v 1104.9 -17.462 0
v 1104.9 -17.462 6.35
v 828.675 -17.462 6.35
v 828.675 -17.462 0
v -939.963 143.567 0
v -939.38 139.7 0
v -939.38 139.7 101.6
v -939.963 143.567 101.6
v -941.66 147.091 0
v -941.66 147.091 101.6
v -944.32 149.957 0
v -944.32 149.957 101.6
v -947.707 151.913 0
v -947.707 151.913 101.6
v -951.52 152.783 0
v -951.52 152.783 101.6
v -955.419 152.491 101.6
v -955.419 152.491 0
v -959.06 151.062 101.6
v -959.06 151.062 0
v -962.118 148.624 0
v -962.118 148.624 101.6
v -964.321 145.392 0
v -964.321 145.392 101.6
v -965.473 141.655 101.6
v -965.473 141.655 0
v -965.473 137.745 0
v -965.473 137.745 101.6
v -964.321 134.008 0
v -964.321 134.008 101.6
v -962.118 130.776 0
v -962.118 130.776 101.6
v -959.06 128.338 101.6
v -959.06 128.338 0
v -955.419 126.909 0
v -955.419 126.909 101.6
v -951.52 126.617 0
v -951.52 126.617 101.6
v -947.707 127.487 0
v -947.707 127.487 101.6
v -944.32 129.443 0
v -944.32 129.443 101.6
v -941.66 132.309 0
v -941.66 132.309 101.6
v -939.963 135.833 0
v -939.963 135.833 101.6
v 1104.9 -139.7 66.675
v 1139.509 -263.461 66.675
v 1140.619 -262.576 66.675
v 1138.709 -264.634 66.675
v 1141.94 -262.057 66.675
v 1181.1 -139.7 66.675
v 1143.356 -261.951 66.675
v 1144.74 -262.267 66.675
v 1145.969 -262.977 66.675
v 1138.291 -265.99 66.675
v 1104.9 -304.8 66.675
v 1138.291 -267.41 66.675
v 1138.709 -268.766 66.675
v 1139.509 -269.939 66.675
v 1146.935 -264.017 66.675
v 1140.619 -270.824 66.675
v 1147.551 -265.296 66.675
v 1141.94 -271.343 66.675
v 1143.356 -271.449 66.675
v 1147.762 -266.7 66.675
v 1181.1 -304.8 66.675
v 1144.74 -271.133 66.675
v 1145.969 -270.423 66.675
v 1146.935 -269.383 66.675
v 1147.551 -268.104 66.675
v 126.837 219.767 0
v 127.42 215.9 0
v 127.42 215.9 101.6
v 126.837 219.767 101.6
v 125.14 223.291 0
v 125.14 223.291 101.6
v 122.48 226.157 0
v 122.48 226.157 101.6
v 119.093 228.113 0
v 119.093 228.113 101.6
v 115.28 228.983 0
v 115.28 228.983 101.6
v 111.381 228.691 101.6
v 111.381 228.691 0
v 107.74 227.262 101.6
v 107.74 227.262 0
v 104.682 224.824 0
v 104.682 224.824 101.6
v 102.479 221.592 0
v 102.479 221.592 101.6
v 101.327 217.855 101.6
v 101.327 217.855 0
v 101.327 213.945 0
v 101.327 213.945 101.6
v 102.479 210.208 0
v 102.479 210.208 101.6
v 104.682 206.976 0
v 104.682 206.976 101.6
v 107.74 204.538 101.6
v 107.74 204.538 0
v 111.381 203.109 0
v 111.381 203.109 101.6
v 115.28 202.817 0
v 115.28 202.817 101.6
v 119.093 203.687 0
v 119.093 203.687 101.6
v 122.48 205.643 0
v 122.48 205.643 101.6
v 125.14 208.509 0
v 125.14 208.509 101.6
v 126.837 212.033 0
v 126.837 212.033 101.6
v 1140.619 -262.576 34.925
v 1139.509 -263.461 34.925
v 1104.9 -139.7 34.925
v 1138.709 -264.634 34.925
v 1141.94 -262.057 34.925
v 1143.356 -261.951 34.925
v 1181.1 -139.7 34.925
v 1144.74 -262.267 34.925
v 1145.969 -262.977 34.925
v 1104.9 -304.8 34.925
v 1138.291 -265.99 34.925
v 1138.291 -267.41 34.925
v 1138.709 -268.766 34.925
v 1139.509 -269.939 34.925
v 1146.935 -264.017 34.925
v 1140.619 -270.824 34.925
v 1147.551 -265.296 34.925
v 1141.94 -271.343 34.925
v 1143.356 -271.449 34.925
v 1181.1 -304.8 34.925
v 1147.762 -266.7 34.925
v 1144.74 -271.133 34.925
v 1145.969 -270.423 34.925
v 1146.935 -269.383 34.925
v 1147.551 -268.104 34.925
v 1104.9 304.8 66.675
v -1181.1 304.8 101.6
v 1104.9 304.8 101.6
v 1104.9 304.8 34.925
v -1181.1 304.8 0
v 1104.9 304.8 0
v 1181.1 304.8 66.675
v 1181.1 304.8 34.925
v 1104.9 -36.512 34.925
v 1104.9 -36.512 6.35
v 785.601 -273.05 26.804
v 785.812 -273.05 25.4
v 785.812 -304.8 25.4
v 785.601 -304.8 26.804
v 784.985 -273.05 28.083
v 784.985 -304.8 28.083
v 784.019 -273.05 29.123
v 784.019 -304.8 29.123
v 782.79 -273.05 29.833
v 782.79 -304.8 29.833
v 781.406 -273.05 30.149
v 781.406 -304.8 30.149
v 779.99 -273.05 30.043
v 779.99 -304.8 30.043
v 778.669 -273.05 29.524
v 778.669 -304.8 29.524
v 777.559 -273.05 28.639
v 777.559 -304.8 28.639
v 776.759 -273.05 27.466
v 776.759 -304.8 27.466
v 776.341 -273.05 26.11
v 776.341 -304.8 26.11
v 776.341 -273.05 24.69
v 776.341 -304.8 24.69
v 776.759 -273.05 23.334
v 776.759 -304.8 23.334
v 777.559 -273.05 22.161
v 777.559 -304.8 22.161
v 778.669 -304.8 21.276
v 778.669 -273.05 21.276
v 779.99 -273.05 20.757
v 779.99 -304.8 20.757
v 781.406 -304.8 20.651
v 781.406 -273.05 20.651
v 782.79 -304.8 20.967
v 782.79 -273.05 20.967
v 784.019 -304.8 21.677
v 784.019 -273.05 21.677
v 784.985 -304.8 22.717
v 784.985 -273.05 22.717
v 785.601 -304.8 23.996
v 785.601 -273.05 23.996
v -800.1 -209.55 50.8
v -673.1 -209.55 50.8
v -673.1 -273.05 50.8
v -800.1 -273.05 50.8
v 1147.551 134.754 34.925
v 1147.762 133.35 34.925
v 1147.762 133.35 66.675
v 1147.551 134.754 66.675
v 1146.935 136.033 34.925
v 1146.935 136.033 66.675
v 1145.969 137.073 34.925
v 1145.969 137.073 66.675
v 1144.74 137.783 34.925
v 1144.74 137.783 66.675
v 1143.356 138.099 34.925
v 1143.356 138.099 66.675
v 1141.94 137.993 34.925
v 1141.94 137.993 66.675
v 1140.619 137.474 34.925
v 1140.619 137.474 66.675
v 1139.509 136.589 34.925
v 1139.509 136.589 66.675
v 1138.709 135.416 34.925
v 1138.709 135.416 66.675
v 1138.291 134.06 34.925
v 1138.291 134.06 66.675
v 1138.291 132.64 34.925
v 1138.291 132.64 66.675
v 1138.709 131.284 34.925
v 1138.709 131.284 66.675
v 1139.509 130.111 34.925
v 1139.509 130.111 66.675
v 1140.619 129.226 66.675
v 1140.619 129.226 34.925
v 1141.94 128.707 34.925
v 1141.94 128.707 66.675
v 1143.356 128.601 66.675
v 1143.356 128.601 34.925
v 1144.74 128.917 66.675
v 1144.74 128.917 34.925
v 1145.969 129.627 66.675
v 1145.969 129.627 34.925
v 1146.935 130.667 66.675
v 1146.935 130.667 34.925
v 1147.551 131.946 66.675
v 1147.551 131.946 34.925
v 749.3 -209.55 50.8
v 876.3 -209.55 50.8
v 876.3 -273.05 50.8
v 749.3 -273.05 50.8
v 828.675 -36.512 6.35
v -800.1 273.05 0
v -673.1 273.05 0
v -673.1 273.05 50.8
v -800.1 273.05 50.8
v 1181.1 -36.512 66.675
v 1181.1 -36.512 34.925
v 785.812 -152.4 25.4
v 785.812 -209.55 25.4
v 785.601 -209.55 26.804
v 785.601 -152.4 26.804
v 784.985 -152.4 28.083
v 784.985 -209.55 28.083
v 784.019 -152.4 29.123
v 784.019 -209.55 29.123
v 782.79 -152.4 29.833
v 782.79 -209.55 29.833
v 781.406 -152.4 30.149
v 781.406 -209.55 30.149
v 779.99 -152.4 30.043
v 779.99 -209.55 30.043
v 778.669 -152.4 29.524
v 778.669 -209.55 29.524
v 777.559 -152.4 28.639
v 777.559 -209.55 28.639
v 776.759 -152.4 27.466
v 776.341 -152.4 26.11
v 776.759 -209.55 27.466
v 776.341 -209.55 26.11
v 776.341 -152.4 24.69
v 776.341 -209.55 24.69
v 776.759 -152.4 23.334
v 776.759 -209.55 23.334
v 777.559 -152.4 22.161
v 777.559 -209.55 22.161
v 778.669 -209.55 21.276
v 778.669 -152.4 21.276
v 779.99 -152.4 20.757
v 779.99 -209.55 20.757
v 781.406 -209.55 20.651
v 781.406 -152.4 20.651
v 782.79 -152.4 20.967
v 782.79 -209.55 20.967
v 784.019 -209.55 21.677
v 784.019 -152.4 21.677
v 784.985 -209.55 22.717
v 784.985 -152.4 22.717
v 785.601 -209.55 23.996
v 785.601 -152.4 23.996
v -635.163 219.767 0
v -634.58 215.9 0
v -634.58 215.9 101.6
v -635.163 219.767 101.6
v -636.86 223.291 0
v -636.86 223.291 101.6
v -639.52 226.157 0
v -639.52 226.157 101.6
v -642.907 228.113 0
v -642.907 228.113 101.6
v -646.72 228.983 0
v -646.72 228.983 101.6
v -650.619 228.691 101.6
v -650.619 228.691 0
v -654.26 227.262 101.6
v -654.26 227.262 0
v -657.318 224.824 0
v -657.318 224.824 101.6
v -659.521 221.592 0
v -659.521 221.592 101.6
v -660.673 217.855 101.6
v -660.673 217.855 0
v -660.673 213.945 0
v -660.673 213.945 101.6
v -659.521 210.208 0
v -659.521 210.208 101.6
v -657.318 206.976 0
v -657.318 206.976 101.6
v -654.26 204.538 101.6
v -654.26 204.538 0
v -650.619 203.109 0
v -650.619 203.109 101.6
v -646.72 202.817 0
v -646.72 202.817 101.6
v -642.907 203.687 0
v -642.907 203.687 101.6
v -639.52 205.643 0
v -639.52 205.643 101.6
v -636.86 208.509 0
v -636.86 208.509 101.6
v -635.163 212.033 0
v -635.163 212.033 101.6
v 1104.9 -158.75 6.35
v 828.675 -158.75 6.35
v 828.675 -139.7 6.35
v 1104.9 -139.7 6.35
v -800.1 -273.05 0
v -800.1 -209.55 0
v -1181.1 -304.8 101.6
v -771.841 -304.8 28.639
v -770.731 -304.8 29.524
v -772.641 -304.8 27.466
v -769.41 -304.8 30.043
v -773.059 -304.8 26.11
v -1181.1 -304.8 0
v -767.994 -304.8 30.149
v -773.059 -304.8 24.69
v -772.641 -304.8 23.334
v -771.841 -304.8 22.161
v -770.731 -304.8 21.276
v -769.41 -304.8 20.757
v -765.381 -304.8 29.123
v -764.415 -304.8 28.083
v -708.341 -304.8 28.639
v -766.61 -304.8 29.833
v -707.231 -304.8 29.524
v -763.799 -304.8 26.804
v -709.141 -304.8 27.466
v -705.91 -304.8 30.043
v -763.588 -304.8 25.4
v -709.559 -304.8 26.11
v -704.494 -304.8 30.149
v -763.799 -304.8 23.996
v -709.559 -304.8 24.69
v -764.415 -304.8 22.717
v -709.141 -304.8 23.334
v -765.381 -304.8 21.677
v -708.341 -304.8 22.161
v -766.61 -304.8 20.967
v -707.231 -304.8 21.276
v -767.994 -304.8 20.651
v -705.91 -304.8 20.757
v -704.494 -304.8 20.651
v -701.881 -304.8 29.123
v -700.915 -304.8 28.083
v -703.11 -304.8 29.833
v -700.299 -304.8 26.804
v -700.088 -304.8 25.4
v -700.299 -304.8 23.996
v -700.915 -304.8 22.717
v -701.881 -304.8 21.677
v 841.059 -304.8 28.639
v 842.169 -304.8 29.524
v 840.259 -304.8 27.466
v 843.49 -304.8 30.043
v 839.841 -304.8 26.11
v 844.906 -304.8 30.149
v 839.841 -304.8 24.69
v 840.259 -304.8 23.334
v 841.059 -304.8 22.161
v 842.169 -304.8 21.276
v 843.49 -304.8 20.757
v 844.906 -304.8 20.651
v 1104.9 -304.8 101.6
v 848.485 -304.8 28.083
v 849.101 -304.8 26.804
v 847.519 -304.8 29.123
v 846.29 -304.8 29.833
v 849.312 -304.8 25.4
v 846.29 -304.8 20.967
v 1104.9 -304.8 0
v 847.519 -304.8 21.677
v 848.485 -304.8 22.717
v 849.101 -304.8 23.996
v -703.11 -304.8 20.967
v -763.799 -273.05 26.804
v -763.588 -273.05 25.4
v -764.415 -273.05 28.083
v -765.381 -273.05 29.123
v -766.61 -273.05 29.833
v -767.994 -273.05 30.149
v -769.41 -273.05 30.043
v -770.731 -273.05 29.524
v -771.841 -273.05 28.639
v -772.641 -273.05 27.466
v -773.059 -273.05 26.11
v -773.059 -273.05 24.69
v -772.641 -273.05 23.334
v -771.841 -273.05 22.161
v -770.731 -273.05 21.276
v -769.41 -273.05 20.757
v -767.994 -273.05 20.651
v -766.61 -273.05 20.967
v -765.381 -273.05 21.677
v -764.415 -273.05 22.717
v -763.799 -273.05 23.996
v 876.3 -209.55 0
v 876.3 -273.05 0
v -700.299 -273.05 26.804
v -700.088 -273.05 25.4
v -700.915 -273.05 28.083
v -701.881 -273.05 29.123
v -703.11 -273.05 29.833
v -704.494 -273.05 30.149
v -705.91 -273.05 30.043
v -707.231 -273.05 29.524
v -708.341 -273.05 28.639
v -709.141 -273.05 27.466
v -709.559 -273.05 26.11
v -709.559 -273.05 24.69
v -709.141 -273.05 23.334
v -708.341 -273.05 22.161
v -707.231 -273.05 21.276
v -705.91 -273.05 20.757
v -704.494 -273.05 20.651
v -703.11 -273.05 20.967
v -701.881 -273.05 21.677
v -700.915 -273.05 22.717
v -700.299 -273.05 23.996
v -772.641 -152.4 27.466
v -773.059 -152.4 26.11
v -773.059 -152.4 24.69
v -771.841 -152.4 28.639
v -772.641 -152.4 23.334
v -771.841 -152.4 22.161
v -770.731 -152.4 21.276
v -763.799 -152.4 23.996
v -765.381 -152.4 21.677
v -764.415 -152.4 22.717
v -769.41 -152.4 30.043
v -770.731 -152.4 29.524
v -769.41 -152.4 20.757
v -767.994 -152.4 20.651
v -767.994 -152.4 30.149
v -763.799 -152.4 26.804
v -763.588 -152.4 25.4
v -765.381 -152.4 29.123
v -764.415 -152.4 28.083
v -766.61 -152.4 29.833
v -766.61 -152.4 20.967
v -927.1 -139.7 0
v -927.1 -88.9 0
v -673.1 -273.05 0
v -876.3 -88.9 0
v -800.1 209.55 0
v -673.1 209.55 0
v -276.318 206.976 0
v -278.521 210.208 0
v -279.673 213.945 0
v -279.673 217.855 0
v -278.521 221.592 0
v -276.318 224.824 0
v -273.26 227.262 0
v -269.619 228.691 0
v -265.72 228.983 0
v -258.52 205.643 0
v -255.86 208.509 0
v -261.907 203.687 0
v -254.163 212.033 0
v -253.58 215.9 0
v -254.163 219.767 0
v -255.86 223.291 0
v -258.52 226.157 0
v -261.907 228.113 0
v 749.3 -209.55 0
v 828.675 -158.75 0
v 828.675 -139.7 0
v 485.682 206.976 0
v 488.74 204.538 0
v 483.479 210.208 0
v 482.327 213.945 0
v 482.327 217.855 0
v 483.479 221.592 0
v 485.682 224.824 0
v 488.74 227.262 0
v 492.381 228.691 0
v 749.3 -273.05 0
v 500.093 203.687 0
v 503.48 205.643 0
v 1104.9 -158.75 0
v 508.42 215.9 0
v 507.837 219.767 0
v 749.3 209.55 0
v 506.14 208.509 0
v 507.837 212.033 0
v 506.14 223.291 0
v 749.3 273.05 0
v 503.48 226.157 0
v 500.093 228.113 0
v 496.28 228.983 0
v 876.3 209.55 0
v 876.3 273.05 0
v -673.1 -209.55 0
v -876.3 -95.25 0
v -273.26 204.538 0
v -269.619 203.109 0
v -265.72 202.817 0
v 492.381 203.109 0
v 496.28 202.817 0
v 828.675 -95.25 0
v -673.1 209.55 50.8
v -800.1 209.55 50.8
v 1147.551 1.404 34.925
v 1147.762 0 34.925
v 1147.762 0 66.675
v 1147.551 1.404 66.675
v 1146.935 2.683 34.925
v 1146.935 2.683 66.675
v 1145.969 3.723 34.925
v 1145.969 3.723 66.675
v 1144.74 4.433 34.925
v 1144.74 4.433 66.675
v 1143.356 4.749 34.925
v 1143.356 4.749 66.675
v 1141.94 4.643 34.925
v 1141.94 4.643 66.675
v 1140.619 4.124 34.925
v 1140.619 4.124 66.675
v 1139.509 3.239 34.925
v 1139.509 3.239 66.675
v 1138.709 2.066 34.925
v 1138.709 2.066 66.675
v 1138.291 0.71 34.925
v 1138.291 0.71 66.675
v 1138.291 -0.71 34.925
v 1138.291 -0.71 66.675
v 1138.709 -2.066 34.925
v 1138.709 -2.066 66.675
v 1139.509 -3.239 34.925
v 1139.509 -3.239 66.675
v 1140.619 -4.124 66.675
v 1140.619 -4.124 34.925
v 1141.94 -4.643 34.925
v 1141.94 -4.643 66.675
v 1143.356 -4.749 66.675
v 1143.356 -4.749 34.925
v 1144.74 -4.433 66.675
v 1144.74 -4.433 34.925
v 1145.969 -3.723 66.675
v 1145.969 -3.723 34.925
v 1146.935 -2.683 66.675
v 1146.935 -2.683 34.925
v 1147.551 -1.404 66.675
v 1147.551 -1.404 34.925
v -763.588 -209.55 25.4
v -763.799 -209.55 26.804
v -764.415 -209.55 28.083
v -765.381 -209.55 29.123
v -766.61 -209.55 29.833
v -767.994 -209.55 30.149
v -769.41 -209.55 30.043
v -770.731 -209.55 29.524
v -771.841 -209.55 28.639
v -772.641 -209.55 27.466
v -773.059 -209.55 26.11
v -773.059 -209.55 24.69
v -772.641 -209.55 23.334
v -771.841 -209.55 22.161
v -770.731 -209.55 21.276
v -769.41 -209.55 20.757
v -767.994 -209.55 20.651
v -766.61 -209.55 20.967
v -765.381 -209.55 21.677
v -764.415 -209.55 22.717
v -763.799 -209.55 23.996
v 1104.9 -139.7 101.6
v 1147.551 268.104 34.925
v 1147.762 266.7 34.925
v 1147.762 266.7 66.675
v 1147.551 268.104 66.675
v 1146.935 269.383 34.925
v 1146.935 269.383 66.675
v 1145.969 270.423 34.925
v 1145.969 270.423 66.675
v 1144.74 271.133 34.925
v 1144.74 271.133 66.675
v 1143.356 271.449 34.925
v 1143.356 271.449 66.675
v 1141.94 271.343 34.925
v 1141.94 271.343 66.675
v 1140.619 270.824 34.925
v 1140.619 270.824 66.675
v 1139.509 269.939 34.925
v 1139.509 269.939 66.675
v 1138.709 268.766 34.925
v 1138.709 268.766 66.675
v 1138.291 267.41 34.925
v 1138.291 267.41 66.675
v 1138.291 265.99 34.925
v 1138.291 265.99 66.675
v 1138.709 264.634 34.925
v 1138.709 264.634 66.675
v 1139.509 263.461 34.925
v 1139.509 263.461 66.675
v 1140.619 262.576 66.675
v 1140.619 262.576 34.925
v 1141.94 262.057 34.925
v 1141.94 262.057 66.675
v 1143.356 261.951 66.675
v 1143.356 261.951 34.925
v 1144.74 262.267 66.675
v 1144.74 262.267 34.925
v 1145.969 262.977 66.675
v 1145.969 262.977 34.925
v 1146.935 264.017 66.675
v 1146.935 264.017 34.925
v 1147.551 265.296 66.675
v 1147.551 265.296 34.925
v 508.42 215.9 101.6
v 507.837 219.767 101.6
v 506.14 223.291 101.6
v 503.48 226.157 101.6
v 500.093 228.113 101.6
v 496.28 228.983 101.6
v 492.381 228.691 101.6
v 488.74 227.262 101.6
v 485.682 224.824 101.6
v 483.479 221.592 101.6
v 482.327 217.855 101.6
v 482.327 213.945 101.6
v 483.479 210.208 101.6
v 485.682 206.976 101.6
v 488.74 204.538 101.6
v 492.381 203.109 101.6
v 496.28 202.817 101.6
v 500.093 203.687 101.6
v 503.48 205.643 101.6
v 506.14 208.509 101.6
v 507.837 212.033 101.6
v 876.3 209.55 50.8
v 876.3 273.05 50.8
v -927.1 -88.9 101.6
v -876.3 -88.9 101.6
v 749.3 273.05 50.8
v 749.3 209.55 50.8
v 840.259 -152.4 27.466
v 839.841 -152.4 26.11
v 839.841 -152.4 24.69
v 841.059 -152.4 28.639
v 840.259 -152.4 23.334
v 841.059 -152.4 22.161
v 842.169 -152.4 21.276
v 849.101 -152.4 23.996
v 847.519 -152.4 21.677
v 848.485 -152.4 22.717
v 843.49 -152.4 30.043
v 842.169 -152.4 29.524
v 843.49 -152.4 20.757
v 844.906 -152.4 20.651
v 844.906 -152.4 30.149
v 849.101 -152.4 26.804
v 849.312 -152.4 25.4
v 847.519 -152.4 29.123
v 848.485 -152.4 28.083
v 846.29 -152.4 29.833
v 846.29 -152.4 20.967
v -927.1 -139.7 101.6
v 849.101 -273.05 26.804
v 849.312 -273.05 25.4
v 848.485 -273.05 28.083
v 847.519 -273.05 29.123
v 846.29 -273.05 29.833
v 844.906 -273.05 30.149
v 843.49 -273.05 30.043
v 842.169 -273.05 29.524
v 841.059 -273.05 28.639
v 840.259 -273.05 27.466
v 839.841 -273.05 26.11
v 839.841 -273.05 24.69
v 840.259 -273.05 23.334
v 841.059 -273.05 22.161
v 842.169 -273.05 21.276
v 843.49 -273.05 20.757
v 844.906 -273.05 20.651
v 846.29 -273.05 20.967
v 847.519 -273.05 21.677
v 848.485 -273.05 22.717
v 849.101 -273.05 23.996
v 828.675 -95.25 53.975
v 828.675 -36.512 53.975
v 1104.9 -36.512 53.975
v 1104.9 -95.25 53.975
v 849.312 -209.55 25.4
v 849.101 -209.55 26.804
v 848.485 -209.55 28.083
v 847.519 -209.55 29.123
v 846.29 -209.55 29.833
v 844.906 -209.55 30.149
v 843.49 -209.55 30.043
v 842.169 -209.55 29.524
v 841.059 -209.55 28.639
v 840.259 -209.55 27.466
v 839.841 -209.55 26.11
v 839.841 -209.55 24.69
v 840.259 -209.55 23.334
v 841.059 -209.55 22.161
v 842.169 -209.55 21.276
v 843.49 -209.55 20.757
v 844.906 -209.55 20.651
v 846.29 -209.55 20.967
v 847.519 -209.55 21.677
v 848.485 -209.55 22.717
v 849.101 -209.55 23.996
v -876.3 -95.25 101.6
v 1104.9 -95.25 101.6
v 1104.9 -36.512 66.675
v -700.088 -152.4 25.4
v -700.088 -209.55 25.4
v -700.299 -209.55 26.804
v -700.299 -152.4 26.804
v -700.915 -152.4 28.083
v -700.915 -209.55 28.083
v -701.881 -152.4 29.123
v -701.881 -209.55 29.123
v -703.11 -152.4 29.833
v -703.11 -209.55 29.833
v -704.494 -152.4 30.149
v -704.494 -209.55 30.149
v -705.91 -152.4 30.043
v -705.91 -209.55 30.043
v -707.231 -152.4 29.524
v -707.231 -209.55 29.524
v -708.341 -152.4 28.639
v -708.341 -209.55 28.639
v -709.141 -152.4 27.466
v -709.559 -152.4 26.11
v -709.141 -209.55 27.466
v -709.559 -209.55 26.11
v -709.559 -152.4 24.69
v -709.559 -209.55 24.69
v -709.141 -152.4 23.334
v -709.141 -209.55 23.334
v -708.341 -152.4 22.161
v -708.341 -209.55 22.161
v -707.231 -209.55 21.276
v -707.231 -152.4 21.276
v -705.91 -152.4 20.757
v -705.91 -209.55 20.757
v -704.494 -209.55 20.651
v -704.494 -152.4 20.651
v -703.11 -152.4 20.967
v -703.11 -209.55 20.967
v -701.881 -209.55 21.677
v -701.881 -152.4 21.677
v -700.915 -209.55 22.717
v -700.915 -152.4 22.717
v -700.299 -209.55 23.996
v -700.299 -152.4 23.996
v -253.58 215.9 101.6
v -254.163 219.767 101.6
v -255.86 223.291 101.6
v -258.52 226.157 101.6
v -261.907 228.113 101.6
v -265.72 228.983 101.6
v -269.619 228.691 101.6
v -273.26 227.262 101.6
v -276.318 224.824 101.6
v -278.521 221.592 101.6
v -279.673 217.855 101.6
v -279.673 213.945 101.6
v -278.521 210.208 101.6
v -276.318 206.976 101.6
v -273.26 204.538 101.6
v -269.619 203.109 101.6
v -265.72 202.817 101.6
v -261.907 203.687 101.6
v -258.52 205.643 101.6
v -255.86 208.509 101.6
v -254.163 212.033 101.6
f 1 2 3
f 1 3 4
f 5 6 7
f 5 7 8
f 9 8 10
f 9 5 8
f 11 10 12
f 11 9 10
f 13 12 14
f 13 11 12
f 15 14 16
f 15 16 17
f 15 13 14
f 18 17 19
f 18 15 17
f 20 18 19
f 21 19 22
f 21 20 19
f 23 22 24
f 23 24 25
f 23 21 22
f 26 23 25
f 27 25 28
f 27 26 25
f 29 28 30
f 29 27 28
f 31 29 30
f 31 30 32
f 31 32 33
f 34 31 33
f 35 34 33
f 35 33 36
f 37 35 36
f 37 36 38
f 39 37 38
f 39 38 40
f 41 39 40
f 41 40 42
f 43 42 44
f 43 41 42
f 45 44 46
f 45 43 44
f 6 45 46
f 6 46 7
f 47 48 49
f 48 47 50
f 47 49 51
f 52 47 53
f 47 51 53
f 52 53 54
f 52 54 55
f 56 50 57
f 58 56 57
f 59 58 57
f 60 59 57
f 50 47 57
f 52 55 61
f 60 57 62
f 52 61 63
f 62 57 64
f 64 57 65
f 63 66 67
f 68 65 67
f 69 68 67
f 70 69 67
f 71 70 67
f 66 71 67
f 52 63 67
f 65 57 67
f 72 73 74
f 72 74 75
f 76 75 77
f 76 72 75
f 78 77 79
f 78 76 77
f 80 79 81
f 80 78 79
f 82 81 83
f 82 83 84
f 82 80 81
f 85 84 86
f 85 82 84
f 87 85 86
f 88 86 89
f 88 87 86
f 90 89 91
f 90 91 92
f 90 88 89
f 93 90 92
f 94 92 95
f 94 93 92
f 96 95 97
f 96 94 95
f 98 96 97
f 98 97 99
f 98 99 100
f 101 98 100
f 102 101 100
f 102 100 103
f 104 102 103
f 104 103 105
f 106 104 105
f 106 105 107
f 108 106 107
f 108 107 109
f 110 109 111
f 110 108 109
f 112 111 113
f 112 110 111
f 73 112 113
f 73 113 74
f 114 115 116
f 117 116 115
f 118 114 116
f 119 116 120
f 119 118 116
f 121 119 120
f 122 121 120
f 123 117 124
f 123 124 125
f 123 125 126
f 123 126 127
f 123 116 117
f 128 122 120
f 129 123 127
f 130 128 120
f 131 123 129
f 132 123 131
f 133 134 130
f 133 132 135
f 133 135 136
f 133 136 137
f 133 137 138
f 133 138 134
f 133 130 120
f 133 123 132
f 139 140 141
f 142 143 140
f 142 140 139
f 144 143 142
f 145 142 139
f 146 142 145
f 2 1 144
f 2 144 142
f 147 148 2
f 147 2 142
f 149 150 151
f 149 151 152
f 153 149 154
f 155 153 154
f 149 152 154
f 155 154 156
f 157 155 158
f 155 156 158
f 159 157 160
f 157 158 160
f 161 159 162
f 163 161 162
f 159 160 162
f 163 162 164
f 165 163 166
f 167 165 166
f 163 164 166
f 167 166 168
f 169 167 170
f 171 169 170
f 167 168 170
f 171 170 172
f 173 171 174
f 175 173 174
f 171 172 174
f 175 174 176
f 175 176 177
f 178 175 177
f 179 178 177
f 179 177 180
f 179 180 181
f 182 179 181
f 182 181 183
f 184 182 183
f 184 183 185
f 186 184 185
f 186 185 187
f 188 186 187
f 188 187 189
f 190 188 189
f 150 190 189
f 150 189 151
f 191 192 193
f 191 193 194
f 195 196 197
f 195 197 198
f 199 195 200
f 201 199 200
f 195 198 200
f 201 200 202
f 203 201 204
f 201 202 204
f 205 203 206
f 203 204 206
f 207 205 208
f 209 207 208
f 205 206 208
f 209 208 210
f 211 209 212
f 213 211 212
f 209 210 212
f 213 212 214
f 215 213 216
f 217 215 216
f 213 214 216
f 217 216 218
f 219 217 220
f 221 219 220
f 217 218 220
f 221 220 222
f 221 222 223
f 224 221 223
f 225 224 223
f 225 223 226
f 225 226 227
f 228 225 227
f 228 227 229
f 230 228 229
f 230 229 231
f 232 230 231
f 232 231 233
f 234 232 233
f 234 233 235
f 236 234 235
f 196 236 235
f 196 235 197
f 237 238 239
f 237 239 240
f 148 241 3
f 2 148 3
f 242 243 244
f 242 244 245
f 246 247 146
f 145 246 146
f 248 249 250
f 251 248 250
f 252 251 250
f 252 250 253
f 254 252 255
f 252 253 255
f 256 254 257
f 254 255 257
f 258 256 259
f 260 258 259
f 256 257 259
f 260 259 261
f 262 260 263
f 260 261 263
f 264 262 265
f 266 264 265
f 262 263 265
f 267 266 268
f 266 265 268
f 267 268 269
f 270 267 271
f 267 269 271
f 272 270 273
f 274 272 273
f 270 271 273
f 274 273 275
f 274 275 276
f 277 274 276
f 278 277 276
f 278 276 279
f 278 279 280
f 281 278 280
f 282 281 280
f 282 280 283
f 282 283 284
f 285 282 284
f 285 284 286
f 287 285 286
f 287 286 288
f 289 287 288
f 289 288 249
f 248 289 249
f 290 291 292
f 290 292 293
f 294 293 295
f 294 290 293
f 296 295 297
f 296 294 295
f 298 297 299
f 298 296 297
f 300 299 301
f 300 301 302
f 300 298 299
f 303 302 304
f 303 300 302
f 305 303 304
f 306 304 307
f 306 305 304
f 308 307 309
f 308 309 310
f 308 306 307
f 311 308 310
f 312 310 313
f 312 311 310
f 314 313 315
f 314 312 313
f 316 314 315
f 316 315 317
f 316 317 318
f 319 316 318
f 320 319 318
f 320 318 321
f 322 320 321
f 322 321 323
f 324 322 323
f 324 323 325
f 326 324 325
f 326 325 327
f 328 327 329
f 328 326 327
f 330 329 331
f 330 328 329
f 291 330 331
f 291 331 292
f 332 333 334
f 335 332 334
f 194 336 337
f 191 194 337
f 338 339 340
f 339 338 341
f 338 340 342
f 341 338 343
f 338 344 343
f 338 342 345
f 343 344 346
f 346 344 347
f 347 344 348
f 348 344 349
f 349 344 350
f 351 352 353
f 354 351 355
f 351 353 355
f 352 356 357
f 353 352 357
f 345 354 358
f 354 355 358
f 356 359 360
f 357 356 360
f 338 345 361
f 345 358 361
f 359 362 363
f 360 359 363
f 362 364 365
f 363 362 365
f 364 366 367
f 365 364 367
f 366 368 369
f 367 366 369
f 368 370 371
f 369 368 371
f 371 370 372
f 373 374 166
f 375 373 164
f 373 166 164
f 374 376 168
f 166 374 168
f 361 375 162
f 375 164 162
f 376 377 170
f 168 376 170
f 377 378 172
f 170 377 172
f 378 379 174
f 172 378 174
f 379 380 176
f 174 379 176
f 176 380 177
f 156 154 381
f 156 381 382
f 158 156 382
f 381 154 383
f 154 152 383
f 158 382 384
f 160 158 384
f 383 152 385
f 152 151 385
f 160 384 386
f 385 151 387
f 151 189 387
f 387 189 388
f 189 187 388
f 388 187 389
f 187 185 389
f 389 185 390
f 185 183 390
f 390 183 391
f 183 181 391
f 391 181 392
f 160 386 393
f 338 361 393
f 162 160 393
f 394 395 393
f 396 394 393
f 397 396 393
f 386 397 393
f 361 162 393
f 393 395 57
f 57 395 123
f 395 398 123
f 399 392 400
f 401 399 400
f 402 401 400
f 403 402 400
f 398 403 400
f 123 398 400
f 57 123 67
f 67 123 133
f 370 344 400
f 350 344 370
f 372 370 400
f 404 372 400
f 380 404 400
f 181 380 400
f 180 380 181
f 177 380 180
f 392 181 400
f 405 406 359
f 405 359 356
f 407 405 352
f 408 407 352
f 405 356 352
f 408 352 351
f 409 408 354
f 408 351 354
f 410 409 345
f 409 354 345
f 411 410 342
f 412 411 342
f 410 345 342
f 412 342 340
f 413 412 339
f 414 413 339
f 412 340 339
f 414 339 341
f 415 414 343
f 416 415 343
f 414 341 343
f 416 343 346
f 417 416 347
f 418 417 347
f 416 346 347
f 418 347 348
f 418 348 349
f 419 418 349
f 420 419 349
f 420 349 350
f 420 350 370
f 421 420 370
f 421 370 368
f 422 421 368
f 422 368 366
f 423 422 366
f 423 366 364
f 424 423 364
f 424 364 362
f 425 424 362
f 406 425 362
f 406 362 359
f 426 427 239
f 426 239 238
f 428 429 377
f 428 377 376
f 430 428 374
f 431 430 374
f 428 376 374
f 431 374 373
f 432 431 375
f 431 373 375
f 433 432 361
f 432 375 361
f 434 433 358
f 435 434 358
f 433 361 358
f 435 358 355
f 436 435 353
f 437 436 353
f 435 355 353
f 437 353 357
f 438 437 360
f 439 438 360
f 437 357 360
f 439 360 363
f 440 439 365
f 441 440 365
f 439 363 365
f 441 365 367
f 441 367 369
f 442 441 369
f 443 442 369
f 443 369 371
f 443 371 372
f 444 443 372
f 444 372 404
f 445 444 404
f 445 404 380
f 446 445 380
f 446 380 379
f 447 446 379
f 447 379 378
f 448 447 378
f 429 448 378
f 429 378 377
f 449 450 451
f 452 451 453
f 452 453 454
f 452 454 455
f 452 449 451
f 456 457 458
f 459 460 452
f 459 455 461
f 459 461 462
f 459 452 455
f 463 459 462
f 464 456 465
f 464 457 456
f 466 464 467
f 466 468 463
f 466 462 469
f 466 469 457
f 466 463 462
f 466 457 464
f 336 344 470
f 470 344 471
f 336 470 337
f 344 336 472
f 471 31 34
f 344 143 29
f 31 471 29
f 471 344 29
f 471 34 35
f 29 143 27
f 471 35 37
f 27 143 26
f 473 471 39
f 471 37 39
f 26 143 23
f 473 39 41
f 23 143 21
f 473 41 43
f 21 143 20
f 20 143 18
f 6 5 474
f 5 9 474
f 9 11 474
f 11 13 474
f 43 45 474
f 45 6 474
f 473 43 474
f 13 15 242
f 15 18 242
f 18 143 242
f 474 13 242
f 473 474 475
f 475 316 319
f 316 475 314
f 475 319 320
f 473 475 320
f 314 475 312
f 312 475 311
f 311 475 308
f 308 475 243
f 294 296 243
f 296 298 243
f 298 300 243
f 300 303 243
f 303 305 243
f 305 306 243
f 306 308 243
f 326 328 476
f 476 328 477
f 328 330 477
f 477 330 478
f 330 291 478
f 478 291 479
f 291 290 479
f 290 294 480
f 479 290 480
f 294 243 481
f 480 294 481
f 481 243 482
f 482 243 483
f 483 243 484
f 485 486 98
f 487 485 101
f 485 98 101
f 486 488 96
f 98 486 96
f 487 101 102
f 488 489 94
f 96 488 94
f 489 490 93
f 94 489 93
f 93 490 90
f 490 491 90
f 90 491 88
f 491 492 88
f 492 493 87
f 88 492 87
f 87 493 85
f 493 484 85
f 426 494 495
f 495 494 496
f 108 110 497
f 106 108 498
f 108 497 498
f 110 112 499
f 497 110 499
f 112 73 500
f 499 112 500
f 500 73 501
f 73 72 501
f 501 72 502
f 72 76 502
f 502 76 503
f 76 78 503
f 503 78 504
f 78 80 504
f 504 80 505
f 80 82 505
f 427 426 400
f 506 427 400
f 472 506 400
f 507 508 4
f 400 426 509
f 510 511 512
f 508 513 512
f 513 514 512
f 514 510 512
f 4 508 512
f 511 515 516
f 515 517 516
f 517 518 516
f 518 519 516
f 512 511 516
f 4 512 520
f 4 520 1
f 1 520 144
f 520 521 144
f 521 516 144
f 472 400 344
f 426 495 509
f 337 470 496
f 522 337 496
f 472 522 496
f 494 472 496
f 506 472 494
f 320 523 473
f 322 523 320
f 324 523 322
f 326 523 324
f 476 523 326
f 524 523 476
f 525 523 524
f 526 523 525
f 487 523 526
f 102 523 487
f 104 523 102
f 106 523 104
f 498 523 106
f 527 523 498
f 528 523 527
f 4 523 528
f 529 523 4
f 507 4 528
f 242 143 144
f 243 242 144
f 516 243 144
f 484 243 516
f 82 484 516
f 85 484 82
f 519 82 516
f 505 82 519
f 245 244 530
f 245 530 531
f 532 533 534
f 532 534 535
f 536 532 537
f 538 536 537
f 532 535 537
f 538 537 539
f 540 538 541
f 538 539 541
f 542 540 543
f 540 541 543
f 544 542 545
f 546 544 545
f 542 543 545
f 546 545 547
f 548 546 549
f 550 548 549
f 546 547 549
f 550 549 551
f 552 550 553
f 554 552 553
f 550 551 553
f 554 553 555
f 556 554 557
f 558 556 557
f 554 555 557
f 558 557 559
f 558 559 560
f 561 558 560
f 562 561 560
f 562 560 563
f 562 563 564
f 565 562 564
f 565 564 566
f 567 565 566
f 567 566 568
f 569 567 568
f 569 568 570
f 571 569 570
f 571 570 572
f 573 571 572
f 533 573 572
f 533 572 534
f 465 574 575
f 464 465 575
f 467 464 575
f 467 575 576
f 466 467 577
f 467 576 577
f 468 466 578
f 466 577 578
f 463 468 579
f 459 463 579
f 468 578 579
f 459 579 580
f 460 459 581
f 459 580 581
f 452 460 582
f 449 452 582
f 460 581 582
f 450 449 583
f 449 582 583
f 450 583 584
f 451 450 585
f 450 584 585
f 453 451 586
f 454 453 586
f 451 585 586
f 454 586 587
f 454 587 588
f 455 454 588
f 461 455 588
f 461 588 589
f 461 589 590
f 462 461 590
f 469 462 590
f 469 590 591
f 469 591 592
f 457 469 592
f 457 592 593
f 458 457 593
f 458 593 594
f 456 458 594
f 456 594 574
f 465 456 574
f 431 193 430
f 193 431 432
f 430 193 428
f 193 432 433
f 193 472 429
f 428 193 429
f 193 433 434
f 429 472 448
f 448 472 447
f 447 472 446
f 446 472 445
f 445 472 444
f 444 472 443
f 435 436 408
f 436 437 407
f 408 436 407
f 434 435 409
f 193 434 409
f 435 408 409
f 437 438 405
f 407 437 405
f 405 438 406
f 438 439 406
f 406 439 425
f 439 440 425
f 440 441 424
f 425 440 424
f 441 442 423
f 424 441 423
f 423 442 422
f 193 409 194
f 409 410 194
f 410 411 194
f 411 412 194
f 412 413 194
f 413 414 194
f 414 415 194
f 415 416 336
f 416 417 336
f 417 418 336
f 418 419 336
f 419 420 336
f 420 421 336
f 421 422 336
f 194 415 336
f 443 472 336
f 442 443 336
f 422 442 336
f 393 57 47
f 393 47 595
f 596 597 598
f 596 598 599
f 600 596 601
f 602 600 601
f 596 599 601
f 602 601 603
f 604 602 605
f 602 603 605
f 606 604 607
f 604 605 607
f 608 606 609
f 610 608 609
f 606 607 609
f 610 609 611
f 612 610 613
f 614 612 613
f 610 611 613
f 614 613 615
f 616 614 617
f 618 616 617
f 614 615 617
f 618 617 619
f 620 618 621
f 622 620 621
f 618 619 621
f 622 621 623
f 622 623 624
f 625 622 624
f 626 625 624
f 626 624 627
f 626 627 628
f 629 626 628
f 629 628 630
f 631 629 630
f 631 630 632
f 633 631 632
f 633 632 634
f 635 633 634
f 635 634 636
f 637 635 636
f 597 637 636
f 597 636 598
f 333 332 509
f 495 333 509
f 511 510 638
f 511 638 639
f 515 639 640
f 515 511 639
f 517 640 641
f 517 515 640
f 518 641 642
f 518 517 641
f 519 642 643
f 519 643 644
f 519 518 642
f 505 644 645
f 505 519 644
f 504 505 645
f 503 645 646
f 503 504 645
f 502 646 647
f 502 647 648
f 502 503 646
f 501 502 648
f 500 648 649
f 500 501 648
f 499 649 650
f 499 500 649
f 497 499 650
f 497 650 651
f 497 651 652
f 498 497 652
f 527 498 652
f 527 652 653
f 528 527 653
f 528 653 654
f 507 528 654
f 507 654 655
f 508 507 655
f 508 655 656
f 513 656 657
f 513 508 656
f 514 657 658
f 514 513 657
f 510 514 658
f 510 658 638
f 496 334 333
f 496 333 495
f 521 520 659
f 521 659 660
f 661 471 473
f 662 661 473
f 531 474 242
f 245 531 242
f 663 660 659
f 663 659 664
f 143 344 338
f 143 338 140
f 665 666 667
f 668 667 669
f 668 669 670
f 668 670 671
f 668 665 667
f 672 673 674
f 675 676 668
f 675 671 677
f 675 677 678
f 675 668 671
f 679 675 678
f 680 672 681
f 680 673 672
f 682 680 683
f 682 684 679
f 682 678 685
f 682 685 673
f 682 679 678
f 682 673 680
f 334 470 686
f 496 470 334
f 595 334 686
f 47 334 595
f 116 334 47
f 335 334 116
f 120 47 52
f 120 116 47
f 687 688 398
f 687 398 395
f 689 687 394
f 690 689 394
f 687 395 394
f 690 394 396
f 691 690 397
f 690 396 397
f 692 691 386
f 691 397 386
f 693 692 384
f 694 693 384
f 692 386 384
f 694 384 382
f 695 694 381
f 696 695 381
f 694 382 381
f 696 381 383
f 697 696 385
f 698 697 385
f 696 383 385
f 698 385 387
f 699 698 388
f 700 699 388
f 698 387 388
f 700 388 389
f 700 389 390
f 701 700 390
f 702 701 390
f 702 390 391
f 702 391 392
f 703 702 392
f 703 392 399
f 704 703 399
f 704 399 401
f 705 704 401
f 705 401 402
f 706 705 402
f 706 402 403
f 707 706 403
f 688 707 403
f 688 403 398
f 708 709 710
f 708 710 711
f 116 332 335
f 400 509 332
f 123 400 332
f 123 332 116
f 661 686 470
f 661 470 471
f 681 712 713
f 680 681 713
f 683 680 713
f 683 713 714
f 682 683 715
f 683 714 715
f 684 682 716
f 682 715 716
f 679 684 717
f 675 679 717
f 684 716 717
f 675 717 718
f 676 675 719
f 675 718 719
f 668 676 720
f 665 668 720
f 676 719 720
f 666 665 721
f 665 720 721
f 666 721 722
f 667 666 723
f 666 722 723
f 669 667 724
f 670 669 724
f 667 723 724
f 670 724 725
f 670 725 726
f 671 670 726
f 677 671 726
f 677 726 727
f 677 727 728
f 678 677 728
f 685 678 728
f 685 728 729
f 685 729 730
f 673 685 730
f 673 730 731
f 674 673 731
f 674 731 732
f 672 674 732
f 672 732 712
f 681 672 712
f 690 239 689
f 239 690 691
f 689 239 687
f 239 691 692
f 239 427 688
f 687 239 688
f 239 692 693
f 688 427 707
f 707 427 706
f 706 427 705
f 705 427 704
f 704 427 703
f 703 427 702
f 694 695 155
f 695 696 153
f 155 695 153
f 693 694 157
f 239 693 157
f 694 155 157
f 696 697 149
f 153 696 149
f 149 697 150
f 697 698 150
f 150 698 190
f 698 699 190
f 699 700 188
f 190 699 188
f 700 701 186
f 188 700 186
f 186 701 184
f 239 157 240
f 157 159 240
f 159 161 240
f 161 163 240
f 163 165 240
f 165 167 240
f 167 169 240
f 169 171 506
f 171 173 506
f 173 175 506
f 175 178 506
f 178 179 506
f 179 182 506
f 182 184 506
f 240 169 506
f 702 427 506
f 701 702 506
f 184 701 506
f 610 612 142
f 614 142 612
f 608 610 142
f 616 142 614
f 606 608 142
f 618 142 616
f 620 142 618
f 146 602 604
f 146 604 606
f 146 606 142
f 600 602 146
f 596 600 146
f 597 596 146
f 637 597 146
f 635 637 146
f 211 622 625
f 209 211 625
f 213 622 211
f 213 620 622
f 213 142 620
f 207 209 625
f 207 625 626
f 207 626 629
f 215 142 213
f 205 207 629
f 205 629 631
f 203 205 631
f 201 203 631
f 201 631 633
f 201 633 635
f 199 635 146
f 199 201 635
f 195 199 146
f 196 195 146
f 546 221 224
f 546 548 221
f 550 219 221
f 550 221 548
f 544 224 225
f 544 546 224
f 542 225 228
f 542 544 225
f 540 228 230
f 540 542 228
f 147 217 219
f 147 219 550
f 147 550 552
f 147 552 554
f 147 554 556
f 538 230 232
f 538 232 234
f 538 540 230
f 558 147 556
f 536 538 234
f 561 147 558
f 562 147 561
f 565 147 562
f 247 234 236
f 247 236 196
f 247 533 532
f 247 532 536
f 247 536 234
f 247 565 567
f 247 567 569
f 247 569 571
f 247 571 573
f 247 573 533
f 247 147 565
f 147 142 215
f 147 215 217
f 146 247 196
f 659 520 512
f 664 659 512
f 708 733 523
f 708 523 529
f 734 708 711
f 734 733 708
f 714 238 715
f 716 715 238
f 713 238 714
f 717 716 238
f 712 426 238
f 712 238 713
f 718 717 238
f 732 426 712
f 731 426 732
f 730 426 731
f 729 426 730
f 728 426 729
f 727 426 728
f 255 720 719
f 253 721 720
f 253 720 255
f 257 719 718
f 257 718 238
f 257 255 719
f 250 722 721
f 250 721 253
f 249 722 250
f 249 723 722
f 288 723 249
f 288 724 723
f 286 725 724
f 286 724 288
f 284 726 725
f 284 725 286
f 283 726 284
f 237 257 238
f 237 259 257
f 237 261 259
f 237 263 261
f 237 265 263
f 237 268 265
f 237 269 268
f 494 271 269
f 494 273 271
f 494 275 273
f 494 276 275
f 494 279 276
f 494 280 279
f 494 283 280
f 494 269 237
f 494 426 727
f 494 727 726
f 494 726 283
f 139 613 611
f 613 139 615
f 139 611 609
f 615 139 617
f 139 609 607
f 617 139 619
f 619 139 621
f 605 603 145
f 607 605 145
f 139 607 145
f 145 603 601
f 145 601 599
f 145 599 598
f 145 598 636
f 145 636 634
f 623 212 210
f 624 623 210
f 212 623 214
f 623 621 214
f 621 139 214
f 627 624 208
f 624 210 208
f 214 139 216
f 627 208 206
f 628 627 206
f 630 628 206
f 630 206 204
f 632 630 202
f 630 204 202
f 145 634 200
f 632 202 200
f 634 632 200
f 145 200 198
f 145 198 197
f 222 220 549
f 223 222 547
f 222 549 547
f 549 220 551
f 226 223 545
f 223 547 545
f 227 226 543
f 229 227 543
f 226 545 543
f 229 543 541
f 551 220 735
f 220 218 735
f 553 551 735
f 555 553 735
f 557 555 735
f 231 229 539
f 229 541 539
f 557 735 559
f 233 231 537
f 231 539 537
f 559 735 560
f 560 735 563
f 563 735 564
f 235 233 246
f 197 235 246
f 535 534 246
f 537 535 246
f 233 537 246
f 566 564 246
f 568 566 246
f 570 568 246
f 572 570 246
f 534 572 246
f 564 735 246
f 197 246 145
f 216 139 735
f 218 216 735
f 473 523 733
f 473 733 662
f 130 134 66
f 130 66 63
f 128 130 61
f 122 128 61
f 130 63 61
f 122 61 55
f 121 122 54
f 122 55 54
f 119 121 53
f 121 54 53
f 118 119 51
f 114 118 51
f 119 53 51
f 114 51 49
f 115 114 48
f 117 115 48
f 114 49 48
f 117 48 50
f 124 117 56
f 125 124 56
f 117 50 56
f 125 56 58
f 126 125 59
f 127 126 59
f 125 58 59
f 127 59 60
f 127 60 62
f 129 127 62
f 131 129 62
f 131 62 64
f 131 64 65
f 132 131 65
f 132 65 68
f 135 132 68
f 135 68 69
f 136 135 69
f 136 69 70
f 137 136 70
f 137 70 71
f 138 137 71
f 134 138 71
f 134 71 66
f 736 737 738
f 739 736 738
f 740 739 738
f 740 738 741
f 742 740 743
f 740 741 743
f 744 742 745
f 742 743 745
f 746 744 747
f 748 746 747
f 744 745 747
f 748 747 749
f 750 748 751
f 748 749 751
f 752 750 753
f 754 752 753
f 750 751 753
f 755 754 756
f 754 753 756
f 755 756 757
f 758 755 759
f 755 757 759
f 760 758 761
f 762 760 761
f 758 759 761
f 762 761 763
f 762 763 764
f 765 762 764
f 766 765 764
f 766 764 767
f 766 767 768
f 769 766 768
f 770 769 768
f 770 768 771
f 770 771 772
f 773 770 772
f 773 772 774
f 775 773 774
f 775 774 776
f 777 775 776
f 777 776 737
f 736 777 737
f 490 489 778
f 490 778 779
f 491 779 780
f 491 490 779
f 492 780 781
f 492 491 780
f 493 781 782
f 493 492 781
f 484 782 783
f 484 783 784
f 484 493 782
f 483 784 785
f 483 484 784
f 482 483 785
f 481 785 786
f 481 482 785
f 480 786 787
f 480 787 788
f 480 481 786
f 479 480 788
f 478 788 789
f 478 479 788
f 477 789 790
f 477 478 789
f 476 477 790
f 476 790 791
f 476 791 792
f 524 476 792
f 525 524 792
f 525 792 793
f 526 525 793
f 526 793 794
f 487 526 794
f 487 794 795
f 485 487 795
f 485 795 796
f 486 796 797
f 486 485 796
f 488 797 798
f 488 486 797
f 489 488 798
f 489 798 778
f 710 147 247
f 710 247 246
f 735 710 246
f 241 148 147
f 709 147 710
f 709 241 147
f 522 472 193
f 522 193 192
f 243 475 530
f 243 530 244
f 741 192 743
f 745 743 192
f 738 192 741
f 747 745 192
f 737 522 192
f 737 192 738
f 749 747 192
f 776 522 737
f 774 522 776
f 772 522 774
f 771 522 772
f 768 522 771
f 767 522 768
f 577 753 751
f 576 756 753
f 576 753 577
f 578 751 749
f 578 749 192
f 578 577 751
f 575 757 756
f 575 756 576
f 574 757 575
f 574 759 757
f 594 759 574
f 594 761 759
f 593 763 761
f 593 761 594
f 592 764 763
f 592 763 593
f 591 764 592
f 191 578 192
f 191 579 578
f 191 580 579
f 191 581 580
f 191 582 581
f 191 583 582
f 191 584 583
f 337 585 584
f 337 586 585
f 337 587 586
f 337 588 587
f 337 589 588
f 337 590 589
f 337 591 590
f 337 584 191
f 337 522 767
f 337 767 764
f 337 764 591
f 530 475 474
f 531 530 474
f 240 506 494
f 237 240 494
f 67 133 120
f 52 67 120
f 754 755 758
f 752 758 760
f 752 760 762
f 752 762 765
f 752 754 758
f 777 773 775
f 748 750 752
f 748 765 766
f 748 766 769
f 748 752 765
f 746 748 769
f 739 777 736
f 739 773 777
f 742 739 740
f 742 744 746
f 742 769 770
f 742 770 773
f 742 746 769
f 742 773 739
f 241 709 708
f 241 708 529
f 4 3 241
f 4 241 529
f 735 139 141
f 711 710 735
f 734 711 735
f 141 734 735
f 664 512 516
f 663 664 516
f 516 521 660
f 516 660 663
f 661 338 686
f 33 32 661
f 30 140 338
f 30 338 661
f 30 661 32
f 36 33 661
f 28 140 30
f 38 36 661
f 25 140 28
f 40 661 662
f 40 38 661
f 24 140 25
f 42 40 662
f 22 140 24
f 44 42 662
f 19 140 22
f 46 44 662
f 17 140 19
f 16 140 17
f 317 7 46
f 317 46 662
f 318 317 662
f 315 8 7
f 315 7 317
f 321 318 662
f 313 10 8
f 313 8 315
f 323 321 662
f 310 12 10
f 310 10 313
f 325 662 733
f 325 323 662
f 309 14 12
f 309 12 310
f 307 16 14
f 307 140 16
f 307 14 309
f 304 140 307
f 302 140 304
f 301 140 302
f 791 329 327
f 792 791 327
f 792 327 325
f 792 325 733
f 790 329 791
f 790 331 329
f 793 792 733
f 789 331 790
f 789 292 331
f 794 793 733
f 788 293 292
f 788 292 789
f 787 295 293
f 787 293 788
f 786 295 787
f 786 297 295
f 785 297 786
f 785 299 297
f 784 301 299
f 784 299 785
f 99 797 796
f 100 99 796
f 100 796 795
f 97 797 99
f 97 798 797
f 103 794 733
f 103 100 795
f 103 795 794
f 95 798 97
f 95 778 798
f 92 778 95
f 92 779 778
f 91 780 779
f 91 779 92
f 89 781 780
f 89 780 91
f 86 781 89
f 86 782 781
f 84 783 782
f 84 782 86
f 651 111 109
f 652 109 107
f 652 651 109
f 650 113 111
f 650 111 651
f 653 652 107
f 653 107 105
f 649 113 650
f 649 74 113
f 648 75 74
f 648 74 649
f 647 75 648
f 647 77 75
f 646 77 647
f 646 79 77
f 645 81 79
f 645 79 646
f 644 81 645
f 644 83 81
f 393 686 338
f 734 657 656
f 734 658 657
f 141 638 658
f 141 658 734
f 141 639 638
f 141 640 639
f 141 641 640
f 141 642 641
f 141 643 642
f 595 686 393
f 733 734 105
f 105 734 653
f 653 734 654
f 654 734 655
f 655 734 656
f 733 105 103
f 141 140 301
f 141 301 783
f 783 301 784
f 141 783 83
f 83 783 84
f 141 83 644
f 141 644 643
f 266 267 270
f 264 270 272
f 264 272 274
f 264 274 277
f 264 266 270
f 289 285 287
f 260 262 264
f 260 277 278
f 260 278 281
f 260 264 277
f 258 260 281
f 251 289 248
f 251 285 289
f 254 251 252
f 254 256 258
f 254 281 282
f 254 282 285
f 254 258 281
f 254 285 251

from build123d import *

# Parameters (mm, degrees)
SKETCH1_W               = 2362.2
SKETCH1_H               = 609.6
SKETCH1_R               = 13.119830451
SKETCH1_W_2             = 50.8
SKETCH1_H_2             = 50.8
BOSS_EXTRUDE1_DEPTH     = 101.6
SKETCH2_W               = 127
SKETCH2_H               = 63.5
CUT_EXTRUDE1_DEPTH      = 50.8
SKETCH3_R               = 4.7625
CUT_EXTRUDE2_DEPTH      = 152.4
SKETCH4_W               = 76.2
SKETCH4_H               = 34.925
CUT_EXTRUDE3_DEPTH      = 1334.016102678
CUT_EXTRUDE4_DEPTH      = 2384.94933671
CUT_EXTRUDE4_DEPTH_BACK = 352.425
SKETCH5_W               = 6.35
SKETCH5_H               = 19.05
SKETCH6_W               = 101.6
SKETCH6_H               = 103.1875
CUT_EXTRUDE5_DEPTH      = 76.2
SKETCH7_R               = 4.7625
CUT_EXTRUDE6_DEPTH      = 1222.6160631
SKETCH9_W               = 1704.975
SKETCH9_H               = 44.45
CUT_EXTRUDE7_DEPTH      = 1225.019121583


with BuildPart() as part:
    # Sketch1 → Boss-Extrude1 (new body)
    with BuildSketch(Plane.XY):
        Rectangle(SKETCH1_W, SKETCH1_H)
        with Locations((-952.5, 139.7)):
            Circle(SKETCH1_R, mode=Mode.SUBTRACT)
        with Locations((-647.7, 215.9)):
            Circle(SKETCH1_R, mode=Mode.SUBTRACT)
        with Locations((-266.7, 215.9)):
            Circle(SKETCH1_R, mode=Mode.SUBTRACT)
        with Locations((114.3, 215.9)):
            Circle(SKETCH1_R, mode=Mode.SUBTRACT)
        with Locations((495.3, 215.9)):
            Circle(SKETCH1_R, mode=Mode.SUBTRACT)
        with Locations((-901.7, -114.3)):
            Rectangle(SKETCH1_W_2, SKETCH1_H_2, mode=Mode.SUBTRACT)
    extrude(amount=BOSS_EXTRUDE1_DEPTH)

    # Sketch2 → Cut-Extrude1 (cut)
    with BuildSketch(Plane(origin=(0, 0, 0), x_dir=(-1, 0, 0), z_dir=(0, 0, -1))):
        with Locations((736.6, 241.3)):
            Rectangle(SKETCH2_W, SKETCH2_H)
        with Locations((736.6, -241.3)):
            Rectangle(SKETCH2_W, SKETCH2_H)
        with Locations((-812.8, 241.3)):
            Rectangle(SKETCH2_W, SKETCH2_H)
        with Locations((-812.8, -241.3)):
            Rectangle(SKETCH2_W, SKETCH2_H)
    extrude(amount=-CUT_EXTRUDE1_DEPTH, mode=Mode.SUBTRACT)

    # Sketch3 → Cut-Extrude2 (cut)
    with BuildSketch(Plane.XZ.offset(304.8)):
        with Locations((844.55, 25.4)):
            Circle(SKETCH3_R)
        with Locations((781.05, 25.4)):
            Circle(SKETCH3_R)
        with Locations((-704.85, 25.4)):
            Circle(SKETCH3_R)
        with Locations((-768.35, 25.4)):
            Circle(SKETCH3_R)
    extrude(amount=-CUT_EXTRUDE2_DEPTH, mode=Mode.SUBTRACT)

    # Sketch4 → Cut-Extrude3 (cut, through all)
    with BuildSketch(Plane.XZ.offset(304.8)):
        with Locations((1143, 17.4625)):
            Rectangle(SKETCH4_W, SKETCH4_H)
        with Locations((1143, 84.1375)):
            Rectangle(SKETCH4_W, SKETCH4_H)
    extrude(amount=-CUT_EXTRUDE3_DEPTH, mode=Mode.SUBTRACT)

    # Sketch5 → Cut-Extrude4 (cut, two sides: drawn at the far end of the back side and taken through both)
    # profile 1 of 4: a face of its own
    with BuildSketch(Plane(origin=(1181.1, 0, 0), x_dir=(0, 0, -1), z_dir=(1, 0, 0)).offset(-CUT_EXTRUDE4_DEPTH_BACK)):
        with Locations((-3.175, -149.225)):
            Rectangle(SKETCH5_W, SKETCH5_H)
    # profile 2 of 4: a face of its own
    with BuildSketch(Plane(origin=(1181.1, 0, 0), x_dir=(0, 0, -1), z_dir=(1, 0, 0)).offset(-CUT_EXTRUDE4_DEPTH_BACK)):
        Polygon((-6.35, -139.7), (0, -139.7), (0, -36.5125), (-6.35, -36.5125), (-53.975, -36.5125), (-53.975, -77.7875), (-53.975, -95.25), (-101.6, -95.25), (-101.6, -139.7), align=None)
        with BuildLine():
            ThreePointArc((-12.7, -77.7875), (-31.75, -96.8375), (-50.8, -77.7875))
            ThreePointArc((-50.8, -77.7875), (-31.75, -58.7375), (-12.7, -77.7875))
        make_face(mode=Mode.SUBTRACT)
    # profile 3 of 4: a face of its own
    with BuildSketch(Plane(origin=(1181.1, 0, 0), x_dir=(0, 0, -1), z_dir=(1, 0, 0)).offset(-CUT_EXTRUDE4_DEPTH_BACK)):
        with BuildLine():
            ThreePointArc((-12.7, -77.7875), (-31.75, -58.7375), (-50.8, -77.7875))
            ThreePointArc((-50.8, -77.7875), (-31.75, -96.8375), (-12.7, -77.7875))
        make_face()
    # profile 4 of 4: a face of its own
    with BuildSketch(Plane(origin=(1181.1, 0, 0), x_dir=(0, 0, -1), z_dir=(1, 0, 0)).offset(-CUT_EXTRUDE4_DEPTH_BACK)):
        with Locations((-3.175, -26.9875)):
            Rectangle(SKETCH5_W, SKETCH5_H)
    extrude(amount=CUT_EXTRUDE4_DEPTH + CUT_EXTRUDE4_DEPTH_BACK, mode=Mode.SUBTRACT)

    # Sketch6 → Cut-Extrude5 (cut)
    with BuildSketch(Plane(origin=(1181.1, 0, 0), x_dir=(0, 0, -1), z_dir=(1, 0, 0))):
        with Locations((-50.8, -88.10625)):
            Rectangle(SKETCH6_W, SKETCH6_H)
    extrude(amount=-CUT_EXTRUDE5_DEPTH, mode=Mode.SUBTRACT)

    # Sketch7 → Cut-Extrude6 (cut, through all)
    with BuildSketch(Plane.XY.offset(66.675)):
        with Locations((1143, 266.7)):
            Circle(SKETCH7_R)
        with Locations((1143, 133.35)):
            Circle(SKETCH7_R)
        with Locations((1143, 0)):
            Circle(SKETCH7_R)
        with Locations((1143, -266.7)):
            Circle(SKETCH7_R)
    extrude(amount=-CUT_EXTRUDE6_DEPTH, mode=Mode.SUBTRACT)

    # Sketch9 → Cut-Extrude7 (cut, through all)
    with BuildSketch(Plane.XY.offset(101.6)):
        with Locations((-23.8125, -117.475)):
            Rectangle(SKETCH9_W, SKETCH9_H)
    extrude(amount=-CUT_EXTRUDE7_DEPTH, mode=Mode.SUBTRACT)


solid = part.part
